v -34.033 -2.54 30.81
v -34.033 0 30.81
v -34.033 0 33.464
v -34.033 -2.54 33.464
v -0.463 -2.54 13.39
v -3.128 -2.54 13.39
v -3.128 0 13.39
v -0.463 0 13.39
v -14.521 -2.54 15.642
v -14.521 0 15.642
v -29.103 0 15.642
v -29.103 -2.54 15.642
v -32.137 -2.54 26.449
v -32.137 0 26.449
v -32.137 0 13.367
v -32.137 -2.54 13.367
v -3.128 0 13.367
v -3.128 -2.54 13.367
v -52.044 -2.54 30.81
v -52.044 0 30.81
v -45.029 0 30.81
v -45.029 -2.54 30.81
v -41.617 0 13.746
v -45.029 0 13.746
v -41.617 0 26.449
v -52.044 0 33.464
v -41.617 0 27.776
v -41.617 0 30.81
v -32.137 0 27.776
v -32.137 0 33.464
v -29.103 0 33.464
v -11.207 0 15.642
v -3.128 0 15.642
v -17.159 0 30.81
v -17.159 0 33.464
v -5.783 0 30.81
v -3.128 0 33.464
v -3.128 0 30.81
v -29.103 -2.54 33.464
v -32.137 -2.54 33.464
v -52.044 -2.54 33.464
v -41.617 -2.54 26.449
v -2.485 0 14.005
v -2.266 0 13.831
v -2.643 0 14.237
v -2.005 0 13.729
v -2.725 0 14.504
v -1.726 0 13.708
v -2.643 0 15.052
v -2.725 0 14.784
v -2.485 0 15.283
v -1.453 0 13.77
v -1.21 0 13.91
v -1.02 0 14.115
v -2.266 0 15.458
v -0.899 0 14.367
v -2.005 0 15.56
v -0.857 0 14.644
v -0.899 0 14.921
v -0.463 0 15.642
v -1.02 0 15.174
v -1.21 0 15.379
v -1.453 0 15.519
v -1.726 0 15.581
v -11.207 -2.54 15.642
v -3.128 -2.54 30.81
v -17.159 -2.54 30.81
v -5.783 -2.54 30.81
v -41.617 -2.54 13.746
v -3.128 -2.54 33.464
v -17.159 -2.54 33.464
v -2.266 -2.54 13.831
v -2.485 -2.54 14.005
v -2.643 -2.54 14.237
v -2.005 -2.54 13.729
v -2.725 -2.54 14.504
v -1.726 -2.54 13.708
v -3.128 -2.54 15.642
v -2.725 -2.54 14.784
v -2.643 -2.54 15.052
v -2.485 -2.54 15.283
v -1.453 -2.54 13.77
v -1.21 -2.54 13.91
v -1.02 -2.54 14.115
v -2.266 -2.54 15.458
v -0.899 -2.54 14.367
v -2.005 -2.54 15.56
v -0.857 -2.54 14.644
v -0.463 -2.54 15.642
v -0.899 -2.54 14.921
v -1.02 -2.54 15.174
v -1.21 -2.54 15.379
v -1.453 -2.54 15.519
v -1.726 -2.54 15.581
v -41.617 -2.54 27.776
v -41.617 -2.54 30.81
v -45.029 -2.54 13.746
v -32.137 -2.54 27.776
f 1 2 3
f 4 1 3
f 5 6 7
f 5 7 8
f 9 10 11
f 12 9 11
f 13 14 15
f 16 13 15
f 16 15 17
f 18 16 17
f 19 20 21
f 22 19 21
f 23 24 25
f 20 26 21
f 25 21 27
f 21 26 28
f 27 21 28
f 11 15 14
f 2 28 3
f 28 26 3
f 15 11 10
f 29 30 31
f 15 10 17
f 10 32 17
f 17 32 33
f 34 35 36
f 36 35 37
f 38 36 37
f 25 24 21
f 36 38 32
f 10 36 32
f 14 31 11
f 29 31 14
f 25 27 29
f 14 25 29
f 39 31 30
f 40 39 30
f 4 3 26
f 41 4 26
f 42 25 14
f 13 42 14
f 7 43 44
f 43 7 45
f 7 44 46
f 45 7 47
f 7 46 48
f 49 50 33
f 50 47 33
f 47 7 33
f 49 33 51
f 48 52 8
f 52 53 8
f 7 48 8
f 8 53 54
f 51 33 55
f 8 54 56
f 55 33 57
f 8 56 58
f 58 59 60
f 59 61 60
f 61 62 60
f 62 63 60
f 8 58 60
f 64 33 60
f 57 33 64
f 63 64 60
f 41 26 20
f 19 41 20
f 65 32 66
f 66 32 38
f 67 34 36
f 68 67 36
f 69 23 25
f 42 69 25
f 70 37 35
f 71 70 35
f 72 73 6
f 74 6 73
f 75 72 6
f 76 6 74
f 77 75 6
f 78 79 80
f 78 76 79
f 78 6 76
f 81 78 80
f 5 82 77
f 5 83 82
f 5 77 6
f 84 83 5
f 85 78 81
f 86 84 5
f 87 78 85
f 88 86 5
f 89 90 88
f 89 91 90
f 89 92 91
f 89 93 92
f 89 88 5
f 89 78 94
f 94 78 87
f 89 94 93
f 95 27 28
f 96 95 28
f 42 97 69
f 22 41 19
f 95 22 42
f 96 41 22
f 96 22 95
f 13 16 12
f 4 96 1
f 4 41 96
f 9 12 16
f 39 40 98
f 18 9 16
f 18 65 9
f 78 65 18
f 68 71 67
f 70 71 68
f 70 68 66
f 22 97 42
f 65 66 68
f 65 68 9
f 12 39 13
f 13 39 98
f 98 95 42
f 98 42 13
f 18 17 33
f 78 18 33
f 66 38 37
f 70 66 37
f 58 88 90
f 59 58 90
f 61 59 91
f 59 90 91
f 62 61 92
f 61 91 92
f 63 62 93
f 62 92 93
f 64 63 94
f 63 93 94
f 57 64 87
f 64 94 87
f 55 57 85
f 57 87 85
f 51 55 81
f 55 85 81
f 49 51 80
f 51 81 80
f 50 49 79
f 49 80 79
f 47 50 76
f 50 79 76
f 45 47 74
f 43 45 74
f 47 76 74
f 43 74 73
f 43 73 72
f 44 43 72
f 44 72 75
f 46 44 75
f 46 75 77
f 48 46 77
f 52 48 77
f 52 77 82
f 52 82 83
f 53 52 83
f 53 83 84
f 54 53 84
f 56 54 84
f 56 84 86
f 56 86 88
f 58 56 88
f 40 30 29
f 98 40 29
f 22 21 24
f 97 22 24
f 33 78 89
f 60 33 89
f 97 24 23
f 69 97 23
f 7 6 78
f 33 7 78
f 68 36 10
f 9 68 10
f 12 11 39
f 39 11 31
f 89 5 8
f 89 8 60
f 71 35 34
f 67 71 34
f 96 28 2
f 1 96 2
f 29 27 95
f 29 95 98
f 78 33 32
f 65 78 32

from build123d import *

# Parameters (mm, degrees)
F0_W     = 9.4798579812
F0_H     = 1.3271793723
F0_W_2   = 10.9966341406
F0_H_2   = 2.2751661018
F1_DEPTH = 2.54
F2_W     = 2.665358712
F2_H     = 2.2522518411
F3_DEPTH = 2.54
F4_R     = 0.9393932001
F5_DEPTH = 25.4


with BuildPart() as f1:
    # F0 (on Front) → F1 (new body)
    with BuildSketch(Plane.XZ):
        Polygon((-34.0326912701, 33.4638990462), (-52.0444214344, 33.4638990462), (-52.0444214344, 30.8095384389), (-45.0293272734, 30.8095384389), (-41.6165776551, 30.8095384389), (-34.0326912701, 30.8095384389), align=None)
        Polygon((-41.6165776551, 30.8095384389), (-45.0293272734, 30.8095384389), (-45.0293272734, 13.7457931414), (-41.6165776551, 13.7457931414), (-41.6165776551, 26.4488048851), (-41.6165776551, 27.7759842575), align=None)
        with Locations((-36.8766486645, 27.1123945713)):
            Rectangle(F0_W, F0_H)
        Polygon((-32.1367196739, 33.4638990462), (-32.1367196739, 27.7759842575), (-32.1367196739, 26.4488048851), (-32.1367196739, 13.3665995672), (-29.1031636298, 13.3665995672), (-29.1031636298, 15.641765669), (-29.1031636298, 31.9471210241), (-29.1031636298, 33.4638990462), align=None)
        with Locations((-23.6048465595, 14.5041826181)):
            Rectangle(F0_W_2, F0_H_2)
        Polygon((-18.1065294892, 15.641765669), (-18.1065294892, 13.3665995672), (-15.8313624561, 13.3665995672), (-14.5206691614, 15.641765669), align=None)
        Polygon((-14.5206691614, 15.641765669), (-15.8313624561, 13.3665995672), (-12.4186147004, 13.3665995672), (-12.4186147004, 15.641765669), align=None)
        Polygon((-5.7827145793, 30.8095384389), (-14.5206691614, 15.641765669), (-12.4186147004, 15.641765669), (-12.4186147004, 13.3665995672), (-11.2068413846, 15.641765669), (-3.1283532735, 30.8095384389), align=None)
        Polygon((-11.2068413846, 15.641765669), (-12.4186147004, 13.3665995672), (-3.1283532735, 13.3665995672), (-3.1283532735, 15.641765669), align=None)
        Polygon((-17.158543691, 30.8095384389), (-5.7827145793, 30.8095384389), (-3.1283532735, 30.8095384389), (-3.1283532735, 33.4638990462), (-17.158543691, 33.4638990462), (-17.158543691, 31.9471210241), align=None)
    extrude(amount=F1_DEPTH)


with BuildPart() as f3:
    # F2 (on face) → F3 (new body)
    with BuildSketch(Plane.XZ.offset(2.54)):
        with Locations((-1.7956739175, 14.5156397484)):
            Rectangle(F2_W, F2_H)
    extrude(amount=-F3_DEPTH)

    # F4 (on face) → F5 (cut)
    with BuildSketch(Plane.XZ.offset(2.54)):
        with Locations((-1.7961780541, 14.6443592384)):
            Circle(F4_R)
    extrude(amount=-F5_DEPTH, mode=Mode.SUBTRACT)


solid = Compound([f1.part, f3.part])
